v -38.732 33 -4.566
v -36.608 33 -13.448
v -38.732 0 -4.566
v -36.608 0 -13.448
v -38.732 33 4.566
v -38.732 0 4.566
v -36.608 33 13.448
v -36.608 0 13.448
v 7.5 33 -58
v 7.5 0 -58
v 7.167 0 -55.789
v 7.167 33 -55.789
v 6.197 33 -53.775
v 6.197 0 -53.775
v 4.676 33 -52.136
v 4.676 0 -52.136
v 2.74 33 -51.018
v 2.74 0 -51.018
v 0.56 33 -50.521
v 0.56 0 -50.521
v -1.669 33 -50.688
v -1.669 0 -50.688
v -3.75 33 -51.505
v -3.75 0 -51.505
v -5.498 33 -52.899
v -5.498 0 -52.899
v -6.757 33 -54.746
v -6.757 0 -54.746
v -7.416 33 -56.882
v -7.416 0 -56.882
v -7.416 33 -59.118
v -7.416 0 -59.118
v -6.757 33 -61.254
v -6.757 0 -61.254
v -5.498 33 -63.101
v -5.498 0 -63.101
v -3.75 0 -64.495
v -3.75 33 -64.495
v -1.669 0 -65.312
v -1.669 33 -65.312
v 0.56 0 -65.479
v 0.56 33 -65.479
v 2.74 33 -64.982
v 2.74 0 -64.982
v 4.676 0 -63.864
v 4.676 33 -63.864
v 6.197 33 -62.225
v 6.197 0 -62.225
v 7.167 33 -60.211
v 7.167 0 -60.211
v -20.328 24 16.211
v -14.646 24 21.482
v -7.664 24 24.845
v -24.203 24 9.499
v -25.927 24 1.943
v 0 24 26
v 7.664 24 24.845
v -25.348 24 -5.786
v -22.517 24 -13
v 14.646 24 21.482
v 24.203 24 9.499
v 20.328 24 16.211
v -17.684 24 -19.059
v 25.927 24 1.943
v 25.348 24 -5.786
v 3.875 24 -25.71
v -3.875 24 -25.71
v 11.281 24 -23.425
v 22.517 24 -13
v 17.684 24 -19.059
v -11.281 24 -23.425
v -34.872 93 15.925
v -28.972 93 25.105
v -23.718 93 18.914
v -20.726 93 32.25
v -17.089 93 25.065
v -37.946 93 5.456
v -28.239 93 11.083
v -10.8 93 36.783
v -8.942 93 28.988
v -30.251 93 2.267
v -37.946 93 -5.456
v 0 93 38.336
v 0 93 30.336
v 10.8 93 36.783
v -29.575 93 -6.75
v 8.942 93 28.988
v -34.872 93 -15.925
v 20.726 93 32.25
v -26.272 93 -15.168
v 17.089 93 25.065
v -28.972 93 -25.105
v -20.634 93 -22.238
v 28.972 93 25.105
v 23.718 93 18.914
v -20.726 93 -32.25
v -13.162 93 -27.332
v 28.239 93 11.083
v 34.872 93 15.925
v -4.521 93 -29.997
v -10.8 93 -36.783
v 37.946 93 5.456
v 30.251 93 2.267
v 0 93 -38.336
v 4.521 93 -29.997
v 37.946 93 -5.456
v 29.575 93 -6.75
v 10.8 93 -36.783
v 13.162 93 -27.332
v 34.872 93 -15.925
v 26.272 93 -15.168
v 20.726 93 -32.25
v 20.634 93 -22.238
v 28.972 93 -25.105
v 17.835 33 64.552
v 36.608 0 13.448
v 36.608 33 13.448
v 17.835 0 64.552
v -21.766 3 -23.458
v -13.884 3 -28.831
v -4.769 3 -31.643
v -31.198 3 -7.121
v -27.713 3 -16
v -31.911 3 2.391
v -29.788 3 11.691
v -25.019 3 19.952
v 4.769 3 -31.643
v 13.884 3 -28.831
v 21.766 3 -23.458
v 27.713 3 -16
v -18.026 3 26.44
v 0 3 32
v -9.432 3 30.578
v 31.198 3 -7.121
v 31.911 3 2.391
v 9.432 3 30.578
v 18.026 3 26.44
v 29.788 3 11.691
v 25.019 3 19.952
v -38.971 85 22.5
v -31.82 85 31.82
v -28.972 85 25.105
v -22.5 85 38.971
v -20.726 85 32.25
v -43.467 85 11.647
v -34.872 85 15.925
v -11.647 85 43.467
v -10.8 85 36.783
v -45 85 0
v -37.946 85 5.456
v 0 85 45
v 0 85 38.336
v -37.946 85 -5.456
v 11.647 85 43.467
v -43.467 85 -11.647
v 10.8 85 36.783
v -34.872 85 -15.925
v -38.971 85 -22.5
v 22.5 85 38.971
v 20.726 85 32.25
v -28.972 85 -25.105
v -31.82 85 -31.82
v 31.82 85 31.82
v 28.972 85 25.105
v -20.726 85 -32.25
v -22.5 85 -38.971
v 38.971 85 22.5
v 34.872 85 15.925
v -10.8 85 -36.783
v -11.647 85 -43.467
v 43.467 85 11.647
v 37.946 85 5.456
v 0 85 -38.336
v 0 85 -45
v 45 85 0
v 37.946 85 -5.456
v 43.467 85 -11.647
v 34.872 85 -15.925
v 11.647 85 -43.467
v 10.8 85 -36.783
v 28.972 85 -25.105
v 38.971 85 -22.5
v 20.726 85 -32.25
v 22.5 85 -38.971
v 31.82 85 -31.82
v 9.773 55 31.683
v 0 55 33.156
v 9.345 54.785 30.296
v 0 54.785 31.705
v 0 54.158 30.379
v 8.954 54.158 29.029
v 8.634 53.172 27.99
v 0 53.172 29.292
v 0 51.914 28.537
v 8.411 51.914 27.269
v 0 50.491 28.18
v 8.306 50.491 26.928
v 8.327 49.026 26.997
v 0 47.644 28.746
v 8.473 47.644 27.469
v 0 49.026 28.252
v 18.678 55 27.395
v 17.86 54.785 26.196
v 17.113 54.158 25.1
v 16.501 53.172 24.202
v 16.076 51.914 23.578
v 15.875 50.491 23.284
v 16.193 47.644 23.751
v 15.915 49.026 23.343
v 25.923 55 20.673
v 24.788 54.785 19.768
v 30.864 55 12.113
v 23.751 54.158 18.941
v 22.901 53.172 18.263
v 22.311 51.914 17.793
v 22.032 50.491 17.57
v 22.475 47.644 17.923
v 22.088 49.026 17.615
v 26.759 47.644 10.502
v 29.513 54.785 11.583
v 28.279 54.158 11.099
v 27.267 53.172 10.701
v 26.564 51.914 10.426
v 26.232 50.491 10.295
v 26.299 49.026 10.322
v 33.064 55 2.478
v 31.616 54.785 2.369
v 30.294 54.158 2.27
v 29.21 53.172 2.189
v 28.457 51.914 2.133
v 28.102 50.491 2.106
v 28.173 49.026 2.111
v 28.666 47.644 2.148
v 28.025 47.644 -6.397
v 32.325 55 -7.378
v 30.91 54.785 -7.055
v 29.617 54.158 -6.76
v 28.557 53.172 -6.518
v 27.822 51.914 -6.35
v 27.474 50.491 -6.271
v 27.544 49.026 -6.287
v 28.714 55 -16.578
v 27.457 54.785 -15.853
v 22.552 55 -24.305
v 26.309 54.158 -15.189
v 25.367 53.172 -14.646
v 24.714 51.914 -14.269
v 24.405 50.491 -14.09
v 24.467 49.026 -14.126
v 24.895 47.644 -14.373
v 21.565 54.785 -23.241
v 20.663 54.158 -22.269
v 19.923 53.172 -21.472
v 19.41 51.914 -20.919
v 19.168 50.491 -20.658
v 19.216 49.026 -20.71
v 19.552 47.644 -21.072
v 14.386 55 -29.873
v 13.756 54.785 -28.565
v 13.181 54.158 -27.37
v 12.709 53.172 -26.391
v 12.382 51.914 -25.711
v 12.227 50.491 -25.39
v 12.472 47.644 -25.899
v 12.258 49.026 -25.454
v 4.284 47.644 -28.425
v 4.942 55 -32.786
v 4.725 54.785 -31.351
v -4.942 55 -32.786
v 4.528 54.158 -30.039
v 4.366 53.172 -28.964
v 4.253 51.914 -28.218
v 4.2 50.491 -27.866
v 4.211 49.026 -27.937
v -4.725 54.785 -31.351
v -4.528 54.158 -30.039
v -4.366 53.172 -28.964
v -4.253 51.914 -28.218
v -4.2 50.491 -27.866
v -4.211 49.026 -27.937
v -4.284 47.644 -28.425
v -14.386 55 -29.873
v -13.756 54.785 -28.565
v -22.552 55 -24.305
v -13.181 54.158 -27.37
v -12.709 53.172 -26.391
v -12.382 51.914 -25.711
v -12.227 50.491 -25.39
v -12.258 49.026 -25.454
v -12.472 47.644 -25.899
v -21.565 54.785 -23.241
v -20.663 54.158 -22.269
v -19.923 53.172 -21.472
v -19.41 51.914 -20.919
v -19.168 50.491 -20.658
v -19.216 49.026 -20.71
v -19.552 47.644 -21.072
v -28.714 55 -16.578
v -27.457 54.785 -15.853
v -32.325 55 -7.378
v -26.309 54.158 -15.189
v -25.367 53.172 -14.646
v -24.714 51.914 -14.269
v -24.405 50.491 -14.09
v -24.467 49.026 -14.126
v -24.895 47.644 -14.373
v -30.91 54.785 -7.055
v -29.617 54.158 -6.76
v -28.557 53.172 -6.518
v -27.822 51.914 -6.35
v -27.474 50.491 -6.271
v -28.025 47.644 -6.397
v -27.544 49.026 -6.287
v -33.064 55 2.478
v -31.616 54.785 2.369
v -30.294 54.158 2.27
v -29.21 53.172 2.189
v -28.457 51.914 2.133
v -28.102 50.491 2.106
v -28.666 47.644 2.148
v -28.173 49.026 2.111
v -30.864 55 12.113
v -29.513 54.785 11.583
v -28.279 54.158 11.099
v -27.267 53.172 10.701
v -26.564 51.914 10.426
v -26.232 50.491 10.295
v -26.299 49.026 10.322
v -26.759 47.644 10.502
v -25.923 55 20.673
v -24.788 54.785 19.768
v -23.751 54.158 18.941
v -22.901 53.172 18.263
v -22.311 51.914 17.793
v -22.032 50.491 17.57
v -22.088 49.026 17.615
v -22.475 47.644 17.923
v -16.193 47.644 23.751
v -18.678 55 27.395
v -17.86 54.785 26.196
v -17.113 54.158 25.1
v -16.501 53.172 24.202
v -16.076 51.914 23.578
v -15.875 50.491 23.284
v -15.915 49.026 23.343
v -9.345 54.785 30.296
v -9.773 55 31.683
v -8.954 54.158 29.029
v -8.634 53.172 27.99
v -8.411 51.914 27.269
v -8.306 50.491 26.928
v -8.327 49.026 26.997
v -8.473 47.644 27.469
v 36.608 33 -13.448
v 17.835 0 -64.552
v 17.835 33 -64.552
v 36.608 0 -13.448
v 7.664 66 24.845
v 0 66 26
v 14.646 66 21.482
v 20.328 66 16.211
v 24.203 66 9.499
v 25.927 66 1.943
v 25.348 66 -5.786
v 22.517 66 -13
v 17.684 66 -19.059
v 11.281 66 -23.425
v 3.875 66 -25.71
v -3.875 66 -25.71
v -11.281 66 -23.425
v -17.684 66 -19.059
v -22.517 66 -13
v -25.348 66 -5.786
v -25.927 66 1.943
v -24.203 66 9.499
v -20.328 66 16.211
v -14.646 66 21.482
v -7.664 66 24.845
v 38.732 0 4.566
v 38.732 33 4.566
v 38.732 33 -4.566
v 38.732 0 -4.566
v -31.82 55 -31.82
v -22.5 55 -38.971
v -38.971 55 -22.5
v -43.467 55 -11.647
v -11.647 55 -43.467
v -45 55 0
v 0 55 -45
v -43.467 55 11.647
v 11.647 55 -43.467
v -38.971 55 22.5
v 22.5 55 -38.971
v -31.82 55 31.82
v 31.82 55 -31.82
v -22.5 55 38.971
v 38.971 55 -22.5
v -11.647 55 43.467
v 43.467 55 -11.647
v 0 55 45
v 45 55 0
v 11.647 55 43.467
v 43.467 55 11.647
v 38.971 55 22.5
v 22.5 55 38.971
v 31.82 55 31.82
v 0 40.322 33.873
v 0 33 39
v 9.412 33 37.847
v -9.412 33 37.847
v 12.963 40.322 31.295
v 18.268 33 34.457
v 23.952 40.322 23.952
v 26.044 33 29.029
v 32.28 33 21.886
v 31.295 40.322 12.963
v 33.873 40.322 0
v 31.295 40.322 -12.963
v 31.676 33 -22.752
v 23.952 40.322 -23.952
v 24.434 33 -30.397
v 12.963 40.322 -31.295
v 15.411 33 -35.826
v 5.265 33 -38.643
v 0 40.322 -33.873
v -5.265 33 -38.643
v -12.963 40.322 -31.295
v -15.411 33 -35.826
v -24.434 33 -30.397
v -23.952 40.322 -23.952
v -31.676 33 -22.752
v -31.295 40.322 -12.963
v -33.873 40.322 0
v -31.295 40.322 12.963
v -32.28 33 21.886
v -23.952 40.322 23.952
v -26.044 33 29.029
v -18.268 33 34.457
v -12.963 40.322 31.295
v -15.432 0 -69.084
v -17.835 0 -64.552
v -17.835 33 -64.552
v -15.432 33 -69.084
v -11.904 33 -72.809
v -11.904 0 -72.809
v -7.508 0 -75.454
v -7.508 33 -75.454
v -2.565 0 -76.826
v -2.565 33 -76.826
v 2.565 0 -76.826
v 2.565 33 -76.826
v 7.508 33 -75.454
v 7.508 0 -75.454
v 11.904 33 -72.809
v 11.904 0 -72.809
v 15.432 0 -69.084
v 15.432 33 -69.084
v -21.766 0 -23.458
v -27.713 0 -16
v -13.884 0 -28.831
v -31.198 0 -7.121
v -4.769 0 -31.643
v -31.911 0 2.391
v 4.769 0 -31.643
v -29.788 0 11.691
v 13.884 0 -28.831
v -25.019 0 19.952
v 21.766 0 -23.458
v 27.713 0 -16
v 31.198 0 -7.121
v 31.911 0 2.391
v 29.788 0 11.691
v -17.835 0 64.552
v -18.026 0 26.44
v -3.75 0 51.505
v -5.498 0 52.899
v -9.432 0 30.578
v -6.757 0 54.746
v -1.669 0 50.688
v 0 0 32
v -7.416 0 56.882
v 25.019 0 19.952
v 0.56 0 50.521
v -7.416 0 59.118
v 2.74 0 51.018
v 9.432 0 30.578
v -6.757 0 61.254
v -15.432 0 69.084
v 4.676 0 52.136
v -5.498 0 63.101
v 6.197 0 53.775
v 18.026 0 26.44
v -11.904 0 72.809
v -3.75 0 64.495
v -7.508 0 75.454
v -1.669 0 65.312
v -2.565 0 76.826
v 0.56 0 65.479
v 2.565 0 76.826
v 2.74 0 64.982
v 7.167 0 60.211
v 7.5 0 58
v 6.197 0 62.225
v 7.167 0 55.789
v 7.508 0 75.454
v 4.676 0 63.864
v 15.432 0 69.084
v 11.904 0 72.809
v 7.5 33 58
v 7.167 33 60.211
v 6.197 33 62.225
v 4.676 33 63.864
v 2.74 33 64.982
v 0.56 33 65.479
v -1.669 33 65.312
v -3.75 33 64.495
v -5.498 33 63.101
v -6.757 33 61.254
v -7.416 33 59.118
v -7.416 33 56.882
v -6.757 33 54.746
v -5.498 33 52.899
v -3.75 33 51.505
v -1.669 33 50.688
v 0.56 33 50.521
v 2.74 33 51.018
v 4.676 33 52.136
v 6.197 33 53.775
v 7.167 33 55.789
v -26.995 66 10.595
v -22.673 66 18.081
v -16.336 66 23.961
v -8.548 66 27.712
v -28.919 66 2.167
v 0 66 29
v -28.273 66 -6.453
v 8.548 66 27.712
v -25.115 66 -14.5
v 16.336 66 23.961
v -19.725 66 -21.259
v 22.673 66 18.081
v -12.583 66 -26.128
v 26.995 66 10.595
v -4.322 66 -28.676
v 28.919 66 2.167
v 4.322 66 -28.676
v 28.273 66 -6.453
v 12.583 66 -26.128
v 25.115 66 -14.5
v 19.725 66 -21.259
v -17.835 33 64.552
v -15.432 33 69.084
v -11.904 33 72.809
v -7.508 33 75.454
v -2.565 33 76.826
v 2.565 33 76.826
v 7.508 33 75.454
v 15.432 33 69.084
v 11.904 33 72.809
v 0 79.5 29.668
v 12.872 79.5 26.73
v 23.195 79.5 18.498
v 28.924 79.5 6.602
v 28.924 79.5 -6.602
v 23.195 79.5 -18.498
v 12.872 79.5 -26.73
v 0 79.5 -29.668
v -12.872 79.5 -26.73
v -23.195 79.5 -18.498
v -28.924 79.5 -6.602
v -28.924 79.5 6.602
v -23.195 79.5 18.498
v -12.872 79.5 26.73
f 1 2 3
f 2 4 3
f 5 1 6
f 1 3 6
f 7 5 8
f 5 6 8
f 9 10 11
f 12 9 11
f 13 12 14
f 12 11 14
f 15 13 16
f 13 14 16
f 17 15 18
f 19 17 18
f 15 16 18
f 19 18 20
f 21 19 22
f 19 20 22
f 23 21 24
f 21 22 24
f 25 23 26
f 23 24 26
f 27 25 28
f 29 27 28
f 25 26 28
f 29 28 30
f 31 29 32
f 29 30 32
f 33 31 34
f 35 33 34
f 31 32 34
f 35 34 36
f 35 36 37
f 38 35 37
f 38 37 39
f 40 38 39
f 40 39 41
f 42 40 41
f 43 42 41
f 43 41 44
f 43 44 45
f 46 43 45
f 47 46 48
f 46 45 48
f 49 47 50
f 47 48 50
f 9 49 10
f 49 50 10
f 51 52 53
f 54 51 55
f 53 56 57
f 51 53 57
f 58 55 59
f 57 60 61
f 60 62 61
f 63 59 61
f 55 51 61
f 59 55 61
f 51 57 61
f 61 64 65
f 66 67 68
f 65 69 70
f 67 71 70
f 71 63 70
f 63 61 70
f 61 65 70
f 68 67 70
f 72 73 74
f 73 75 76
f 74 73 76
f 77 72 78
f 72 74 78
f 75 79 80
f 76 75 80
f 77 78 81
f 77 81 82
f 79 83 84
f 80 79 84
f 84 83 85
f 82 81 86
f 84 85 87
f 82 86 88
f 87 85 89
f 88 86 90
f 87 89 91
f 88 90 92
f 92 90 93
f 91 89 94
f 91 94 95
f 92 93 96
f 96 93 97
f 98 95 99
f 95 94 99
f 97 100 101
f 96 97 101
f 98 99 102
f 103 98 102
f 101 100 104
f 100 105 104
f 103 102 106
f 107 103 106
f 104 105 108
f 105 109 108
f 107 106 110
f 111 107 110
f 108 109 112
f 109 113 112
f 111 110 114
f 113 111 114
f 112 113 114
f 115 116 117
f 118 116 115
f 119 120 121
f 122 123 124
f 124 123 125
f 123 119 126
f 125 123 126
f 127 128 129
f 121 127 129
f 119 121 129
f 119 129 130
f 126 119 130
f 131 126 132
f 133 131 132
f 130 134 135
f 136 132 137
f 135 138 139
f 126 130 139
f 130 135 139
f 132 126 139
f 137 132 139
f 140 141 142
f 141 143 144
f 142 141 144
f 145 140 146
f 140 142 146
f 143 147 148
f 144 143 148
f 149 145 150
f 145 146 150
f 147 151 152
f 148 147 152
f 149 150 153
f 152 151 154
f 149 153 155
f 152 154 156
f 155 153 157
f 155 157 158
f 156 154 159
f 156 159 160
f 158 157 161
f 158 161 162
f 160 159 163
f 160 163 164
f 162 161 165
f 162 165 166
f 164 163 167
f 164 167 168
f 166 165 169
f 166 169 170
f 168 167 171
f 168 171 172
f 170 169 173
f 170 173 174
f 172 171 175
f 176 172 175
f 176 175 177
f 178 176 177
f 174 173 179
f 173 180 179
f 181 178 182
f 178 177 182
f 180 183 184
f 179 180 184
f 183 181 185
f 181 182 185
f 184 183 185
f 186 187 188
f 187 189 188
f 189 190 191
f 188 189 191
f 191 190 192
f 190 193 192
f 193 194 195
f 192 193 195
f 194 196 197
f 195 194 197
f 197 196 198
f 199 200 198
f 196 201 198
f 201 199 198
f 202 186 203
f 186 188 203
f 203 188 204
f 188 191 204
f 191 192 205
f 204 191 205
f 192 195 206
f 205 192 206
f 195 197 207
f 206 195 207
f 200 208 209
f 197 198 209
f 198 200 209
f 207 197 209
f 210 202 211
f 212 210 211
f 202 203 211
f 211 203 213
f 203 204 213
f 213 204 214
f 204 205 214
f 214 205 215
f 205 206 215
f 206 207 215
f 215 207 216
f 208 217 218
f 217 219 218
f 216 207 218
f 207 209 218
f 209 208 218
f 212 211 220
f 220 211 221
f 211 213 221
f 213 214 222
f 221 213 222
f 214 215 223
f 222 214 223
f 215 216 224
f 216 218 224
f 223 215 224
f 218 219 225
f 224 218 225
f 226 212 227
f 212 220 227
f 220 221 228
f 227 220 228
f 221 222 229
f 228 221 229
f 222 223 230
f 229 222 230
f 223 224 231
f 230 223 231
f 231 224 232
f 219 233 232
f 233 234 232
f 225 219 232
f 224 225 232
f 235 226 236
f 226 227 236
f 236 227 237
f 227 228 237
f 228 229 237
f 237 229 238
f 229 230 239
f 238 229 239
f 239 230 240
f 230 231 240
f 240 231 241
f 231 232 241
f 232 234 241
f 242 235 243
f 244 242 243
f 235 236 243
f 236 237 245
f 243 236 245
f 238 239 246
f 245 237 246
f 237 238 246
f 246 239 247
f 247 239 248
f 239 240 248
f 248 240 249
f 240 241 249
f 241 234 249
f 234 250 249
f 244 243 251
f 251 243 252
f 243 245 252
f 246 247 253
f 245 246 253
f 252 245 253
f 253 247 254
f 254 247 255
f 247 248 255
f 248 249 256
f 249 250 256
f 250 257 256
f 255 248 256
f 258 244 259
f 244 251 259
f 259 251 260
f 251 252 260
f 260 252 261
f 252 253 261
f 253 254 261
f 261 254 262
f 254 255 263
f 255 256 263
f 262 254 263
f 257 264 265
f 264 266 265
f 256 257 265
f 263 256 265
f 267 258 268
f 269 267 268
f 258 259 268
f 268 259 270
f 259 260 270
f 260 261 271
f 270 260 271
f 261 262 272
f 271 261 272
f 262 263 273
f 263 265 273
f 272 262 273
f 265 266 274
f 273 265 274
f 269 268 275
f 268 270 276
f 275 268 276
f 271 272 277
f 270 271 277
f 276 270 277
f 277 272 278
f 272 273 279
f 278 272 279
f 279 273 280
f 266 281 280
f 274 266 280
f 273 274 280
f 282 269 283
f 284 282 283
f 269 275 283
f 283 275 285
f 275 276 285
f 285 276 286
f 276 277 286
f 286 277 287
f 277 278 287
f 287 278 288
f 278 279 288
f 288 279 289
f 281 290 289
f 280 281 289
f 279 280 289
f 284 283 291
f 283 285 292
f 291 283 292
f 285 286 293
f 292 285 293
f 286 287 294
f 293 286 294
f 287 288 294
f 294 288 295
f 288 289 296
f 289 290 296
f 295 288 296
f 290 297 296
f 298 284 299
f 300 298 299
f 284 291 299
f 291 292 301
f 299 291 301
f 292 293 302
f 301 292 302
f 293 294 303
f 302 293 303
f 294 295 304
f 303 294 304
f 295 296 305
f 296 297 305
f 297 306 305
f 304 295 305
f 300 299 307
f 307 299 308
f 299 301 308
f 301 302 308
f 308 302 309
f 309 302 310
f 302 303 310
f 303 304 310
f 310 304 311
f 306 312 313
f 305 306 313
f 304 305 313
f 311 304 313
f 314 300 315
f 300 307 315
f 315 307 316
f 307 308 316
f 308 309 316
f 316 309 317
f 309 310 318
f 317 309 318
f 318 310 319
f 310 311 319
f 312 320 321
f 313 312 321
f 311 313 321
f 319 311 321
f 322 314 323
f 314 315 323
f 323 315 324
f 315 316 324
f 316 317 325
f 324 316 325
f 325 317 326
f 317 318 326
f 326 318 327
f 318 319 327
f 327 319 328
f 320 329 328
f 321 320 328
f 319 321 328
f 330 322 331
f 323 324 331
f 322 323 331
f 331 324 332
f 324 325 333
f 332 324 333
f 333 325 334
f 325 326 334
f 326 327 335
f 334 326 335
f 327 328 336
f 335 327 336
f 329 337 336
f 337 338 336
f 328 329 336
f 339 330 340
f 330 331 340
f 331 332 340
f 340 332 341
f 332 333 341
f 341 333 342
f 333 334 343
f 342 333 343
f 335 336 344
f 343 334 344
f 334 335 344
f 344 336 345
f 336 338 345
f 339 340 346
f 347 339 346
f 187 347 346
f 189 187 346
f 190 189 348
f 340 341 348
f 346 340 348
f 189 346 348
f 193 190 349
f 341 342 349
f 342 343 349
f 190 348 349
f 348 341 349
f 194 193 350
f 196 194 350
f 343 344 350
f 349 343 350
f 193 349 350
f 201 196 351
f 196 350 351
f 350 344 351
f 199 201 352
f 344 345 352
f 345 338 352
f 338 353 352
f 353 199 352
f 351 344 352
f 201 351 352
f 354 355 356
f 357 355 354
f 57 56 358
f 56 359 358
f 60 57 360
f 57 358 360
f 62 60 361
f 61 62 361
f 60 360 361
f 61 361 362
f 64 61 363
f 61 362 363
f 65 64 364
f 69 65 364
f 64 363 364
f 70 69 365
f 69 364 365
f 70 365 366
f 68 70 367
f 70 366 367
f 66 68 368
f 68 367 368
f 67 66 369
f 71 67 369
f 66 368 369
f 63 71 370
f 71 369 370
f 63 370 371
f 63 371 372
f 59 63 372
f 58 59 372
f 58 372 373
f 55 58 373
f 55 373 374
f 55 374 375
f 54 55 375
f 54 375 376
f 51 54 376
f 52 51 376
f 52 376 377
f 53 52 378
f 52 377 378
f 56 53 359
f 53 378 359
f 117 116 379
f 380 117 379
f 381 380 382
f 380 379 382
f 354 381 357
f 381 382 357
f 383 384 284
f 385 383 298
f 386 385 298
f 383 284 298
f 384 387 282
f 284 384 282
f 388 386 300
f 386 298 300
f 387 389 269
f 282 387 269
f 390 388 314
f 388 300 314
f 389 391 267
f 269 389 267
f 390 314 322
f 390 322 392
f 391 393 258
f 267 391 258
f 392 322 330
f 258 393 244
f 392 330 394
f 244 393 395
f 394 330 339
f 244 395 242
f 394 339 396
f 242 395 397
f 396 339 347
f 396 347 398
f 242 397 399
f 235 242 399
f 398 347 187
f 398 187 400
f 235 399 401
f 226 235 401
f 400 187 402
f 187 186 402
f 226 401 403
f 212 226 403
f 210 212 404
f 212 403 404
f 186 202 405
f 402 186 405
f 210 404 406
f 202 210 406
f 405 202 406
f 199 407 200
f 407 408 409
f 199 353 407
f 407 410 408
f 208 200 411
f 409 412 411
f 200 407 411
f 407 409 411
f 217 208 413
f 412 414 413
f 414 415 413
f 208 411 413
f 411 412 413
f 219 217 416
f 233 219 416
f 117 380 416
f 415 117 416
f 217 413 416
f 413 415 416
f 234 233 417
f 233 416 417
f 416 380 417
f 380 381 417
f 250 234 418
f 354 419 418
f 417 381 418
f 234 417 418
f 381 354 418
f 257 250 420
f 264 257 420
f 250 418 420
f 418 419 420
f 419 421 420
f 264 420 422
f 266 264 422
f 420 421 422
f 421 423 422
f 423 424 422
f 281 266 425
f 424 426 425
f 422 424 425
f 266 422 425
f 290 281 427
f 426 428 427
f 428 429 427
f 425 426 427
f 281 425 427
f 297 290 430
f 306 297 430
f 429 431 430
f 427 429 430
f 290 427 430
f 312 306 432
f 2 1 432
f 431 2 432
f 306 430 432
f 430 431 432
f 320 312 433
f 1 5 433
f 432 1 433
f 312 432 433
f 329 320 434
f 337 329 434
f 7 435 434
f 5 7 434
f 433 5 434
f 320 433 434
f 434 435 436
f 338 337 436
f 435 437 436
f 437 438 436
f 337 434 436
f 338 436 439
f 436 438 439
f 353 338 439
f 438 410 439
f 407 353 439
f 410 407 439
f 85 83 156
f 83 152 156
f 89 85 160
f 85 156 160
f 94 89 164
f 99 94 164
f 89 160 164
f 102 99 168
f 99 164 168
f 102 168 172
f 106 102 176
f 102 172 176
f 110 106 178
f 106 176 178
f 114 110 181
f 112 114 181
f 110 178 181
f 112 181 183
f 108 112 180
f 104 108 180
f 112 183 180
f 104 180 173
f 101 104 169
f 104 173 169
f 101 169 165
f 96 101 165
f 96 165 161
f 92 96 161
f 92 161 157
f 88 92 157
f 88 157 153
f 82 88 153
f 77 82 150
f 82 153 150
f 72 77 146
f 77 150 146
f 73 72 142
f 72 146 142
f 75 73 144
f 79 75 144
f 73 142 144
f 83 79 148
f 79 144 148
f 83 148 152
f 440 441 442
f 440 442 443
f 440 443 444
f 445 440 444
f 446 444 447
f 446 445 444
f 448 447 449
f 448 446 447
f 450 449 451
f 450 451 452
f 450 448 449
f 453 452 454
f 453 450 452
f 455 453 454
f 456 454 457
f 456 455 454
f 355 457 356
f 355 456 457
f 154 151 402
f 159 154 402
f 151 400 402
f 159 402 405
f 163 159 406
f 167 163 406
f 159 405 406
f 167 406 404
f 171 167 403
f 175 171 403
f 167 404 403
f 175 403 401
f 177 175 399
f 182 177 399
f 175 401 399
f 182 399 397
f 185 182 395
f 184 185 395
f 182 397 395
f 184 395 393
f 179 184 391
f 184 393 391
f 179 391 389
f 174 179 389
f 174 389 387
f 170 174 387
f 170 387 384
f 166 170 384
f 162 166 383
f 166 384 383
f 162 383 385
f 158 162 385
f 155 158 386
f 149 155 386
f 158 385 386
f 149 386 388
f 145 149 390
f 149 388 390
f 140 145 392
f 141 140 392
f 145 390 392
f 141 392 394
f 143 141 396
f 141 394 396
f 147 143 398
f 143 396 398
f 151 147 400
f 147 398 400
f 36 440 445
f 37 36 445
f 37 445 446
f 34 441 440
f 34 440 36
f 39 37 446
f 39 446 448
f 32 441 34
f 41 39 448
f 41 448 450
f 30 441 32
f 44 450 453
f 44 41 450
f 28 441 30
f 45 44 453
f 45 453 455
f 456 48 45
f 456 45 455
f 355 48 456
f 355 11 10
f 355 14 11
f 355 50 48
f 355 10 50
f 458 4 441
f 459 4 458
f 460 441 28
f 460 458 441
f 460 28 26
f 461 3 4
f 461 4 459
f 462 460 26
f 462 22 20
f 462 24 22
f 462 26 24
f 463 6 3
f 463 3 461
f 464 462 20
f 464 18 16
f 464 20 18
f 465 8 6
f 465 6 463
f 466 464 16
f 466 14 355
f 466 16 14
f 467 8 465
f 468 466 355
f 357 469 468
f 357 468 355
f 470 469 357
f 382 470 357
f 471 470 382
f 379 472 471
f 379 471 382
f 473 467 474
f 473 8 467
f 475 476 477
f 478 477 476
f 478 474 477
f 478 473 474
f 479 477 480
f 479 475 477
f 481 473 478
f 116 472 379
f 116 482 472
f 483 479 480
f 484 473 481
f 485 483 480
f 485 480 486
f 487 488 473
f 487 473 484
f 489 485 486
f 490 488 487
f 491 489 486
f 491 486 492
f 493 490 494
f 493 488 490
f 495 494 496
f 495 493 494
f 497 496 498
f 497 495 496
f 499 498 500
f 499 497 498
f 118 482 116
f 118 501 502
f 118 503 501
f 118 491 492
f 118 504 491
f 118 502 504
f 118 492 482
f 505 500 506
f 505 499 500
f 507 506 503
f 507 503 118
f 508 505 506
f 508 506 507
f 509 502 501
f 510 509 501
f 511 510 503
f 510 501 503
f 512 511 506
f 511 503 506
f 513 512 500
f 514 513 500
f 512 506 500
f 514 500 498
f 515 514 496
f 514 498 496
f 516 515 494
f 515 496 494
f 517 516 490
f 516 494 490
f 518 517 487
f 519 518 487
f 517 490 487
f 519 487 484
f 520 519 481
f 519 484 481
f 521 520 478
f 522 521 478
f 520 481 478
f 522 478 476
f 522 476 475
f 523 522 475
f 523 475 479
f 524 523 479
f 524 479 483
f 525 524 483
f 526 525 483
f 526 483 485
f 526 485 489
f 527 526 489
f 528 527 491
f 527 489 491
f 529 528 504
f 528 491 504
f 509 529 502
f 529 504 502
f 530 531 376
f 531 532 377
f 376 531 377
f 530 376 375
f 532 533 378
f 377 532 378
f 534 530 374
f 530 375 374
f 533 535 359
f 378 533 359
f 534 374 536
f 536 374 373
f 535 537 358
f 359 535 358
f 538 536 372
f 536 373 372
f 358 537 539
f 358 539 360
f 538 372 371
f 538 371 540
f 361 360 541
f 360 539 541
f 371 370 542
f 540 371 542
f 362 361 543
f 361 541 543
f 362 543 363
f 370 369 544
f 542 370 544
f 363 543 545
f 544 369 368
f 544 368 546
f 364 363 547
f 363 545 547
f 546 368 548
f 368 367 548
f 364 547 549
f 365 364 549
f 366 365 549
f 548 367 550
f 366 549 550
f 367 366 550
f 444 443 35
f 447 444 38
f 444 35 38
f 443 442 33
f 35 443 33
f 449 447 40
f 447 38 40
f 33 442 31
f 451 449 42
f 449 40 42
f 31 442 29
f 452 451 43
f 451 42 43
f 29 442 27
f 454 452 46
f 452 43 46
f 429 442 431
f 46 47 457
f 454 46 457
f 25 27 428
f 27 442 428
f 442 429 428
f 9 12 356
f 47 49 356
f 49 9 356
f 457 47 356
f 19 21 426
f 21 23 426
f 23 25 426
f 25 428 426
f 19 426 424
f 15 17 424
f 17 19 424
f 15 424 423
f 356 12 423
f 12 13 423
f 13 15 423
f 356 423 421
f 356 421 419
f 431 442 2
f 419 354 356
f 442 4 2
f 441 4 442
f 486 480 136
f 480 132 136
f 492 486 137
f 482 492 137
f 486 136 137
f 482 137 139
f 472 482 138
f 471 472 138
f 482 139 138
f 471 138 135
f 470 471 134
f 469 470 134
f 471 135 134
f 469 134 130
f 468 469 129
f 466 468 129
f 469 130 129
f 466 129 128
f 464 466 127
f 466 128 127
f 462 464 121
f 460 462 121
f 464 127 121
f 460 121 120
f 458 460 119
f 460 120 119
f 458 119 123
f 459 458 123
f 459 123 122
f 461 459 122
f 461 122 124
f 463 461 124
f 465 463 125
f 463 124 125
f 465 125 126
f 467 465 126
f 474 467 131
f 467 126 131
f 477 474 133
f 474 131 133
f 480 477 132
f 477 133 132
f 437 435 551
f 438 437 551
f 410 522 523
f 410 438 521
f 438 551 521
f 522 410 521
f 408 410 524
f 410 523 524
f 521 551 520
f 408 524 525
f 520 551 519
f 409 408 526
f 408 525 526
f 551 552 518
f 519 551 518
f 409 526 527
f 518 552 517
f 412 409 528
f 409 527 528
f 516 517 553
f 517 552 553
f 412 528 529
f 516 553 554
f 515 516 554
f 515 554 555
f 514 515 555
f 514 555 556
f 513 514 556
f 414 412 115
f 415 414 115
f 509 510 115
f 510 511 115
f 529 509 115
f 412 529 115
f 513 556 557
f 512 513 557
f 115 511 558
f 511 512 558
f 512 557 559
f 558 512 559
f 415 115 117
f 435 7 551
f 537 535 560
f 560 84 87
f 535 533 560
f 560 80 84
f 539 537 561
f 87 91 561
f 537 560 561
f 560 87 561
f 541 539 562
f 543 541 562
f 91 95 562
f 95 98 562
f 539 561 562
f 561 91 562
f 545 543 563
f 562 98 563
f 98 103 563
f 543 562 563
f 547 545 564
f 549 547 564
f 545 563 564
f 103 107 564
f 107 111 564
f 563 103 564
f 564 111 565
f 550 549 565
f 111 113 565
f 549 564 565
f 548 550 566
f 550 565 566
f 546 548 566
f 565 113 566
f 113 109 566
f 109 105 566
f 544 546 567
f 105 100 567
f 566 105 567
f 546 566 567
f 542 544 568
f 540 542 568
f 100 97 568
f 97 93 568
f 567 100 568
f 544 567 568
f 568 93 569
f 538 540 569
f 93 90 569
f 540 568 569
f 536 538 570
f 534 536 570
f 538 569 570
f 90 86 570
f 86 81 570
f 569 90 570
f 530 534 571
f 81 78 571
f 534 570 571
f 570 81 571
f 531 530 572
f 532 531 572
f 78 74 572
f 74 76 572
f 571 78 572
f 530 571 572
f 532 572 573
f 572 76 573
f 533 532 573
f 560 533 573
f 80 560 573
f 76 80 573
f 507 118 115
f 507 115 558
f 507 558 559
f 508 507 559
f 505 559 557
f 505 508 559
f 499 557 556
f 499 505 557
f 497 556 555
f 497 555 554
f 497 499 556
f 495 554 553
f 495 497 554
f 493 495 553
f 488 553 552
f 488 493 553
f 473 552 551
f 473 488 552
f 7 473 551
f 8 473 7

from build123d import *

# Parameters (mm, degrees)
F2_R     = 7.5
F3_DEPTH = 33


with BuildPart() as f1:
    # F0 (on Right) → F1 (revolve)
    with BuildSketch(Plane.YZ):
        with BuildLine():
            Line((3, 32), (3, 0))
            Line((3, 0), (24, 0))
            Line((24, 0), (24, 26))
            Line((24, 26), (66, 26))
            Line((66, 26), (66, 29))
            Line((66, 29), (93, 30.3359316767))
            Line((93, 30.3359316767), (93, 38.3359316767))
            Line((93, 38.3359316767), (85, 38.3359316767))
            Line((85, 38.3359316767), (85, 45))
            Line((85, 45), (55, 45))
            Line((55, 45), (55, 38.3359316767))
            Line((55, 38.3359316767), (55, 33.1562738389))
            ThreePointArc((55, 33.1562738389), (52.5710475058, 28.8679507724), (47.6441141108, 28.7460809092))
            Line((47.6441141108, 28.7460809092), (33, 39))
            Line((33, 39), (0, 39))
            Line((0, 39), (0, 32))
            Line((0, 32), (3, 32))
        make_face()
    revolve(axis=Axis((0, 13.5, 0), (0, 1, 0)))

    # F2 (on face) → F3 (join)
    with BuildSketch(Plane.XZ):
        with BuildLine():
            Line((36.6079755837, 13.4482758621), (17.8346547716, 64.5517241379))
            ThreePointArc((17.8346547716, 64.5517241379), (0, 77), (-17.8346547716, 64.5517241379))
            Line((-17.8346547716, 64.5517241379), (-36.6079755837, 13.4482758621))
            ThreePointArc((-36.6079755837, 13.4482758621), (-22.3217073874, 31.980328005), (0, 39))
            ThreePointArc((0, 39), (22.3217073874, 31.980328005), (36.6079755837, 13.4482758621))
        make_face()
        with Locations((0, 58)):
            Circle(F2_R, mode=Mode.SUBTRACT)
        with BuildLine():
            ThreePointArc((36.6079755837, -13.4482758621), (0, -39), (-36.6079755837, -13.4482758621))
            Line((-36.6079755837, -13.4482758621), (-17.8346547716, -64.5517241379))
            ThreePointArc((-17.8346547716, -64.5517241379), (0, -77), (17.8346547716, -64.5517241379))
            Line((17.8346547716, -64.5517241379), (36.6079755837, -13.4482758621))
        make_face()
        with Locations((0, -58)):
            Circle(F2_R, mode=Mode.SUBTRACT)
    extrude(amount=-F3_DEPTH)


solid = f1.part
